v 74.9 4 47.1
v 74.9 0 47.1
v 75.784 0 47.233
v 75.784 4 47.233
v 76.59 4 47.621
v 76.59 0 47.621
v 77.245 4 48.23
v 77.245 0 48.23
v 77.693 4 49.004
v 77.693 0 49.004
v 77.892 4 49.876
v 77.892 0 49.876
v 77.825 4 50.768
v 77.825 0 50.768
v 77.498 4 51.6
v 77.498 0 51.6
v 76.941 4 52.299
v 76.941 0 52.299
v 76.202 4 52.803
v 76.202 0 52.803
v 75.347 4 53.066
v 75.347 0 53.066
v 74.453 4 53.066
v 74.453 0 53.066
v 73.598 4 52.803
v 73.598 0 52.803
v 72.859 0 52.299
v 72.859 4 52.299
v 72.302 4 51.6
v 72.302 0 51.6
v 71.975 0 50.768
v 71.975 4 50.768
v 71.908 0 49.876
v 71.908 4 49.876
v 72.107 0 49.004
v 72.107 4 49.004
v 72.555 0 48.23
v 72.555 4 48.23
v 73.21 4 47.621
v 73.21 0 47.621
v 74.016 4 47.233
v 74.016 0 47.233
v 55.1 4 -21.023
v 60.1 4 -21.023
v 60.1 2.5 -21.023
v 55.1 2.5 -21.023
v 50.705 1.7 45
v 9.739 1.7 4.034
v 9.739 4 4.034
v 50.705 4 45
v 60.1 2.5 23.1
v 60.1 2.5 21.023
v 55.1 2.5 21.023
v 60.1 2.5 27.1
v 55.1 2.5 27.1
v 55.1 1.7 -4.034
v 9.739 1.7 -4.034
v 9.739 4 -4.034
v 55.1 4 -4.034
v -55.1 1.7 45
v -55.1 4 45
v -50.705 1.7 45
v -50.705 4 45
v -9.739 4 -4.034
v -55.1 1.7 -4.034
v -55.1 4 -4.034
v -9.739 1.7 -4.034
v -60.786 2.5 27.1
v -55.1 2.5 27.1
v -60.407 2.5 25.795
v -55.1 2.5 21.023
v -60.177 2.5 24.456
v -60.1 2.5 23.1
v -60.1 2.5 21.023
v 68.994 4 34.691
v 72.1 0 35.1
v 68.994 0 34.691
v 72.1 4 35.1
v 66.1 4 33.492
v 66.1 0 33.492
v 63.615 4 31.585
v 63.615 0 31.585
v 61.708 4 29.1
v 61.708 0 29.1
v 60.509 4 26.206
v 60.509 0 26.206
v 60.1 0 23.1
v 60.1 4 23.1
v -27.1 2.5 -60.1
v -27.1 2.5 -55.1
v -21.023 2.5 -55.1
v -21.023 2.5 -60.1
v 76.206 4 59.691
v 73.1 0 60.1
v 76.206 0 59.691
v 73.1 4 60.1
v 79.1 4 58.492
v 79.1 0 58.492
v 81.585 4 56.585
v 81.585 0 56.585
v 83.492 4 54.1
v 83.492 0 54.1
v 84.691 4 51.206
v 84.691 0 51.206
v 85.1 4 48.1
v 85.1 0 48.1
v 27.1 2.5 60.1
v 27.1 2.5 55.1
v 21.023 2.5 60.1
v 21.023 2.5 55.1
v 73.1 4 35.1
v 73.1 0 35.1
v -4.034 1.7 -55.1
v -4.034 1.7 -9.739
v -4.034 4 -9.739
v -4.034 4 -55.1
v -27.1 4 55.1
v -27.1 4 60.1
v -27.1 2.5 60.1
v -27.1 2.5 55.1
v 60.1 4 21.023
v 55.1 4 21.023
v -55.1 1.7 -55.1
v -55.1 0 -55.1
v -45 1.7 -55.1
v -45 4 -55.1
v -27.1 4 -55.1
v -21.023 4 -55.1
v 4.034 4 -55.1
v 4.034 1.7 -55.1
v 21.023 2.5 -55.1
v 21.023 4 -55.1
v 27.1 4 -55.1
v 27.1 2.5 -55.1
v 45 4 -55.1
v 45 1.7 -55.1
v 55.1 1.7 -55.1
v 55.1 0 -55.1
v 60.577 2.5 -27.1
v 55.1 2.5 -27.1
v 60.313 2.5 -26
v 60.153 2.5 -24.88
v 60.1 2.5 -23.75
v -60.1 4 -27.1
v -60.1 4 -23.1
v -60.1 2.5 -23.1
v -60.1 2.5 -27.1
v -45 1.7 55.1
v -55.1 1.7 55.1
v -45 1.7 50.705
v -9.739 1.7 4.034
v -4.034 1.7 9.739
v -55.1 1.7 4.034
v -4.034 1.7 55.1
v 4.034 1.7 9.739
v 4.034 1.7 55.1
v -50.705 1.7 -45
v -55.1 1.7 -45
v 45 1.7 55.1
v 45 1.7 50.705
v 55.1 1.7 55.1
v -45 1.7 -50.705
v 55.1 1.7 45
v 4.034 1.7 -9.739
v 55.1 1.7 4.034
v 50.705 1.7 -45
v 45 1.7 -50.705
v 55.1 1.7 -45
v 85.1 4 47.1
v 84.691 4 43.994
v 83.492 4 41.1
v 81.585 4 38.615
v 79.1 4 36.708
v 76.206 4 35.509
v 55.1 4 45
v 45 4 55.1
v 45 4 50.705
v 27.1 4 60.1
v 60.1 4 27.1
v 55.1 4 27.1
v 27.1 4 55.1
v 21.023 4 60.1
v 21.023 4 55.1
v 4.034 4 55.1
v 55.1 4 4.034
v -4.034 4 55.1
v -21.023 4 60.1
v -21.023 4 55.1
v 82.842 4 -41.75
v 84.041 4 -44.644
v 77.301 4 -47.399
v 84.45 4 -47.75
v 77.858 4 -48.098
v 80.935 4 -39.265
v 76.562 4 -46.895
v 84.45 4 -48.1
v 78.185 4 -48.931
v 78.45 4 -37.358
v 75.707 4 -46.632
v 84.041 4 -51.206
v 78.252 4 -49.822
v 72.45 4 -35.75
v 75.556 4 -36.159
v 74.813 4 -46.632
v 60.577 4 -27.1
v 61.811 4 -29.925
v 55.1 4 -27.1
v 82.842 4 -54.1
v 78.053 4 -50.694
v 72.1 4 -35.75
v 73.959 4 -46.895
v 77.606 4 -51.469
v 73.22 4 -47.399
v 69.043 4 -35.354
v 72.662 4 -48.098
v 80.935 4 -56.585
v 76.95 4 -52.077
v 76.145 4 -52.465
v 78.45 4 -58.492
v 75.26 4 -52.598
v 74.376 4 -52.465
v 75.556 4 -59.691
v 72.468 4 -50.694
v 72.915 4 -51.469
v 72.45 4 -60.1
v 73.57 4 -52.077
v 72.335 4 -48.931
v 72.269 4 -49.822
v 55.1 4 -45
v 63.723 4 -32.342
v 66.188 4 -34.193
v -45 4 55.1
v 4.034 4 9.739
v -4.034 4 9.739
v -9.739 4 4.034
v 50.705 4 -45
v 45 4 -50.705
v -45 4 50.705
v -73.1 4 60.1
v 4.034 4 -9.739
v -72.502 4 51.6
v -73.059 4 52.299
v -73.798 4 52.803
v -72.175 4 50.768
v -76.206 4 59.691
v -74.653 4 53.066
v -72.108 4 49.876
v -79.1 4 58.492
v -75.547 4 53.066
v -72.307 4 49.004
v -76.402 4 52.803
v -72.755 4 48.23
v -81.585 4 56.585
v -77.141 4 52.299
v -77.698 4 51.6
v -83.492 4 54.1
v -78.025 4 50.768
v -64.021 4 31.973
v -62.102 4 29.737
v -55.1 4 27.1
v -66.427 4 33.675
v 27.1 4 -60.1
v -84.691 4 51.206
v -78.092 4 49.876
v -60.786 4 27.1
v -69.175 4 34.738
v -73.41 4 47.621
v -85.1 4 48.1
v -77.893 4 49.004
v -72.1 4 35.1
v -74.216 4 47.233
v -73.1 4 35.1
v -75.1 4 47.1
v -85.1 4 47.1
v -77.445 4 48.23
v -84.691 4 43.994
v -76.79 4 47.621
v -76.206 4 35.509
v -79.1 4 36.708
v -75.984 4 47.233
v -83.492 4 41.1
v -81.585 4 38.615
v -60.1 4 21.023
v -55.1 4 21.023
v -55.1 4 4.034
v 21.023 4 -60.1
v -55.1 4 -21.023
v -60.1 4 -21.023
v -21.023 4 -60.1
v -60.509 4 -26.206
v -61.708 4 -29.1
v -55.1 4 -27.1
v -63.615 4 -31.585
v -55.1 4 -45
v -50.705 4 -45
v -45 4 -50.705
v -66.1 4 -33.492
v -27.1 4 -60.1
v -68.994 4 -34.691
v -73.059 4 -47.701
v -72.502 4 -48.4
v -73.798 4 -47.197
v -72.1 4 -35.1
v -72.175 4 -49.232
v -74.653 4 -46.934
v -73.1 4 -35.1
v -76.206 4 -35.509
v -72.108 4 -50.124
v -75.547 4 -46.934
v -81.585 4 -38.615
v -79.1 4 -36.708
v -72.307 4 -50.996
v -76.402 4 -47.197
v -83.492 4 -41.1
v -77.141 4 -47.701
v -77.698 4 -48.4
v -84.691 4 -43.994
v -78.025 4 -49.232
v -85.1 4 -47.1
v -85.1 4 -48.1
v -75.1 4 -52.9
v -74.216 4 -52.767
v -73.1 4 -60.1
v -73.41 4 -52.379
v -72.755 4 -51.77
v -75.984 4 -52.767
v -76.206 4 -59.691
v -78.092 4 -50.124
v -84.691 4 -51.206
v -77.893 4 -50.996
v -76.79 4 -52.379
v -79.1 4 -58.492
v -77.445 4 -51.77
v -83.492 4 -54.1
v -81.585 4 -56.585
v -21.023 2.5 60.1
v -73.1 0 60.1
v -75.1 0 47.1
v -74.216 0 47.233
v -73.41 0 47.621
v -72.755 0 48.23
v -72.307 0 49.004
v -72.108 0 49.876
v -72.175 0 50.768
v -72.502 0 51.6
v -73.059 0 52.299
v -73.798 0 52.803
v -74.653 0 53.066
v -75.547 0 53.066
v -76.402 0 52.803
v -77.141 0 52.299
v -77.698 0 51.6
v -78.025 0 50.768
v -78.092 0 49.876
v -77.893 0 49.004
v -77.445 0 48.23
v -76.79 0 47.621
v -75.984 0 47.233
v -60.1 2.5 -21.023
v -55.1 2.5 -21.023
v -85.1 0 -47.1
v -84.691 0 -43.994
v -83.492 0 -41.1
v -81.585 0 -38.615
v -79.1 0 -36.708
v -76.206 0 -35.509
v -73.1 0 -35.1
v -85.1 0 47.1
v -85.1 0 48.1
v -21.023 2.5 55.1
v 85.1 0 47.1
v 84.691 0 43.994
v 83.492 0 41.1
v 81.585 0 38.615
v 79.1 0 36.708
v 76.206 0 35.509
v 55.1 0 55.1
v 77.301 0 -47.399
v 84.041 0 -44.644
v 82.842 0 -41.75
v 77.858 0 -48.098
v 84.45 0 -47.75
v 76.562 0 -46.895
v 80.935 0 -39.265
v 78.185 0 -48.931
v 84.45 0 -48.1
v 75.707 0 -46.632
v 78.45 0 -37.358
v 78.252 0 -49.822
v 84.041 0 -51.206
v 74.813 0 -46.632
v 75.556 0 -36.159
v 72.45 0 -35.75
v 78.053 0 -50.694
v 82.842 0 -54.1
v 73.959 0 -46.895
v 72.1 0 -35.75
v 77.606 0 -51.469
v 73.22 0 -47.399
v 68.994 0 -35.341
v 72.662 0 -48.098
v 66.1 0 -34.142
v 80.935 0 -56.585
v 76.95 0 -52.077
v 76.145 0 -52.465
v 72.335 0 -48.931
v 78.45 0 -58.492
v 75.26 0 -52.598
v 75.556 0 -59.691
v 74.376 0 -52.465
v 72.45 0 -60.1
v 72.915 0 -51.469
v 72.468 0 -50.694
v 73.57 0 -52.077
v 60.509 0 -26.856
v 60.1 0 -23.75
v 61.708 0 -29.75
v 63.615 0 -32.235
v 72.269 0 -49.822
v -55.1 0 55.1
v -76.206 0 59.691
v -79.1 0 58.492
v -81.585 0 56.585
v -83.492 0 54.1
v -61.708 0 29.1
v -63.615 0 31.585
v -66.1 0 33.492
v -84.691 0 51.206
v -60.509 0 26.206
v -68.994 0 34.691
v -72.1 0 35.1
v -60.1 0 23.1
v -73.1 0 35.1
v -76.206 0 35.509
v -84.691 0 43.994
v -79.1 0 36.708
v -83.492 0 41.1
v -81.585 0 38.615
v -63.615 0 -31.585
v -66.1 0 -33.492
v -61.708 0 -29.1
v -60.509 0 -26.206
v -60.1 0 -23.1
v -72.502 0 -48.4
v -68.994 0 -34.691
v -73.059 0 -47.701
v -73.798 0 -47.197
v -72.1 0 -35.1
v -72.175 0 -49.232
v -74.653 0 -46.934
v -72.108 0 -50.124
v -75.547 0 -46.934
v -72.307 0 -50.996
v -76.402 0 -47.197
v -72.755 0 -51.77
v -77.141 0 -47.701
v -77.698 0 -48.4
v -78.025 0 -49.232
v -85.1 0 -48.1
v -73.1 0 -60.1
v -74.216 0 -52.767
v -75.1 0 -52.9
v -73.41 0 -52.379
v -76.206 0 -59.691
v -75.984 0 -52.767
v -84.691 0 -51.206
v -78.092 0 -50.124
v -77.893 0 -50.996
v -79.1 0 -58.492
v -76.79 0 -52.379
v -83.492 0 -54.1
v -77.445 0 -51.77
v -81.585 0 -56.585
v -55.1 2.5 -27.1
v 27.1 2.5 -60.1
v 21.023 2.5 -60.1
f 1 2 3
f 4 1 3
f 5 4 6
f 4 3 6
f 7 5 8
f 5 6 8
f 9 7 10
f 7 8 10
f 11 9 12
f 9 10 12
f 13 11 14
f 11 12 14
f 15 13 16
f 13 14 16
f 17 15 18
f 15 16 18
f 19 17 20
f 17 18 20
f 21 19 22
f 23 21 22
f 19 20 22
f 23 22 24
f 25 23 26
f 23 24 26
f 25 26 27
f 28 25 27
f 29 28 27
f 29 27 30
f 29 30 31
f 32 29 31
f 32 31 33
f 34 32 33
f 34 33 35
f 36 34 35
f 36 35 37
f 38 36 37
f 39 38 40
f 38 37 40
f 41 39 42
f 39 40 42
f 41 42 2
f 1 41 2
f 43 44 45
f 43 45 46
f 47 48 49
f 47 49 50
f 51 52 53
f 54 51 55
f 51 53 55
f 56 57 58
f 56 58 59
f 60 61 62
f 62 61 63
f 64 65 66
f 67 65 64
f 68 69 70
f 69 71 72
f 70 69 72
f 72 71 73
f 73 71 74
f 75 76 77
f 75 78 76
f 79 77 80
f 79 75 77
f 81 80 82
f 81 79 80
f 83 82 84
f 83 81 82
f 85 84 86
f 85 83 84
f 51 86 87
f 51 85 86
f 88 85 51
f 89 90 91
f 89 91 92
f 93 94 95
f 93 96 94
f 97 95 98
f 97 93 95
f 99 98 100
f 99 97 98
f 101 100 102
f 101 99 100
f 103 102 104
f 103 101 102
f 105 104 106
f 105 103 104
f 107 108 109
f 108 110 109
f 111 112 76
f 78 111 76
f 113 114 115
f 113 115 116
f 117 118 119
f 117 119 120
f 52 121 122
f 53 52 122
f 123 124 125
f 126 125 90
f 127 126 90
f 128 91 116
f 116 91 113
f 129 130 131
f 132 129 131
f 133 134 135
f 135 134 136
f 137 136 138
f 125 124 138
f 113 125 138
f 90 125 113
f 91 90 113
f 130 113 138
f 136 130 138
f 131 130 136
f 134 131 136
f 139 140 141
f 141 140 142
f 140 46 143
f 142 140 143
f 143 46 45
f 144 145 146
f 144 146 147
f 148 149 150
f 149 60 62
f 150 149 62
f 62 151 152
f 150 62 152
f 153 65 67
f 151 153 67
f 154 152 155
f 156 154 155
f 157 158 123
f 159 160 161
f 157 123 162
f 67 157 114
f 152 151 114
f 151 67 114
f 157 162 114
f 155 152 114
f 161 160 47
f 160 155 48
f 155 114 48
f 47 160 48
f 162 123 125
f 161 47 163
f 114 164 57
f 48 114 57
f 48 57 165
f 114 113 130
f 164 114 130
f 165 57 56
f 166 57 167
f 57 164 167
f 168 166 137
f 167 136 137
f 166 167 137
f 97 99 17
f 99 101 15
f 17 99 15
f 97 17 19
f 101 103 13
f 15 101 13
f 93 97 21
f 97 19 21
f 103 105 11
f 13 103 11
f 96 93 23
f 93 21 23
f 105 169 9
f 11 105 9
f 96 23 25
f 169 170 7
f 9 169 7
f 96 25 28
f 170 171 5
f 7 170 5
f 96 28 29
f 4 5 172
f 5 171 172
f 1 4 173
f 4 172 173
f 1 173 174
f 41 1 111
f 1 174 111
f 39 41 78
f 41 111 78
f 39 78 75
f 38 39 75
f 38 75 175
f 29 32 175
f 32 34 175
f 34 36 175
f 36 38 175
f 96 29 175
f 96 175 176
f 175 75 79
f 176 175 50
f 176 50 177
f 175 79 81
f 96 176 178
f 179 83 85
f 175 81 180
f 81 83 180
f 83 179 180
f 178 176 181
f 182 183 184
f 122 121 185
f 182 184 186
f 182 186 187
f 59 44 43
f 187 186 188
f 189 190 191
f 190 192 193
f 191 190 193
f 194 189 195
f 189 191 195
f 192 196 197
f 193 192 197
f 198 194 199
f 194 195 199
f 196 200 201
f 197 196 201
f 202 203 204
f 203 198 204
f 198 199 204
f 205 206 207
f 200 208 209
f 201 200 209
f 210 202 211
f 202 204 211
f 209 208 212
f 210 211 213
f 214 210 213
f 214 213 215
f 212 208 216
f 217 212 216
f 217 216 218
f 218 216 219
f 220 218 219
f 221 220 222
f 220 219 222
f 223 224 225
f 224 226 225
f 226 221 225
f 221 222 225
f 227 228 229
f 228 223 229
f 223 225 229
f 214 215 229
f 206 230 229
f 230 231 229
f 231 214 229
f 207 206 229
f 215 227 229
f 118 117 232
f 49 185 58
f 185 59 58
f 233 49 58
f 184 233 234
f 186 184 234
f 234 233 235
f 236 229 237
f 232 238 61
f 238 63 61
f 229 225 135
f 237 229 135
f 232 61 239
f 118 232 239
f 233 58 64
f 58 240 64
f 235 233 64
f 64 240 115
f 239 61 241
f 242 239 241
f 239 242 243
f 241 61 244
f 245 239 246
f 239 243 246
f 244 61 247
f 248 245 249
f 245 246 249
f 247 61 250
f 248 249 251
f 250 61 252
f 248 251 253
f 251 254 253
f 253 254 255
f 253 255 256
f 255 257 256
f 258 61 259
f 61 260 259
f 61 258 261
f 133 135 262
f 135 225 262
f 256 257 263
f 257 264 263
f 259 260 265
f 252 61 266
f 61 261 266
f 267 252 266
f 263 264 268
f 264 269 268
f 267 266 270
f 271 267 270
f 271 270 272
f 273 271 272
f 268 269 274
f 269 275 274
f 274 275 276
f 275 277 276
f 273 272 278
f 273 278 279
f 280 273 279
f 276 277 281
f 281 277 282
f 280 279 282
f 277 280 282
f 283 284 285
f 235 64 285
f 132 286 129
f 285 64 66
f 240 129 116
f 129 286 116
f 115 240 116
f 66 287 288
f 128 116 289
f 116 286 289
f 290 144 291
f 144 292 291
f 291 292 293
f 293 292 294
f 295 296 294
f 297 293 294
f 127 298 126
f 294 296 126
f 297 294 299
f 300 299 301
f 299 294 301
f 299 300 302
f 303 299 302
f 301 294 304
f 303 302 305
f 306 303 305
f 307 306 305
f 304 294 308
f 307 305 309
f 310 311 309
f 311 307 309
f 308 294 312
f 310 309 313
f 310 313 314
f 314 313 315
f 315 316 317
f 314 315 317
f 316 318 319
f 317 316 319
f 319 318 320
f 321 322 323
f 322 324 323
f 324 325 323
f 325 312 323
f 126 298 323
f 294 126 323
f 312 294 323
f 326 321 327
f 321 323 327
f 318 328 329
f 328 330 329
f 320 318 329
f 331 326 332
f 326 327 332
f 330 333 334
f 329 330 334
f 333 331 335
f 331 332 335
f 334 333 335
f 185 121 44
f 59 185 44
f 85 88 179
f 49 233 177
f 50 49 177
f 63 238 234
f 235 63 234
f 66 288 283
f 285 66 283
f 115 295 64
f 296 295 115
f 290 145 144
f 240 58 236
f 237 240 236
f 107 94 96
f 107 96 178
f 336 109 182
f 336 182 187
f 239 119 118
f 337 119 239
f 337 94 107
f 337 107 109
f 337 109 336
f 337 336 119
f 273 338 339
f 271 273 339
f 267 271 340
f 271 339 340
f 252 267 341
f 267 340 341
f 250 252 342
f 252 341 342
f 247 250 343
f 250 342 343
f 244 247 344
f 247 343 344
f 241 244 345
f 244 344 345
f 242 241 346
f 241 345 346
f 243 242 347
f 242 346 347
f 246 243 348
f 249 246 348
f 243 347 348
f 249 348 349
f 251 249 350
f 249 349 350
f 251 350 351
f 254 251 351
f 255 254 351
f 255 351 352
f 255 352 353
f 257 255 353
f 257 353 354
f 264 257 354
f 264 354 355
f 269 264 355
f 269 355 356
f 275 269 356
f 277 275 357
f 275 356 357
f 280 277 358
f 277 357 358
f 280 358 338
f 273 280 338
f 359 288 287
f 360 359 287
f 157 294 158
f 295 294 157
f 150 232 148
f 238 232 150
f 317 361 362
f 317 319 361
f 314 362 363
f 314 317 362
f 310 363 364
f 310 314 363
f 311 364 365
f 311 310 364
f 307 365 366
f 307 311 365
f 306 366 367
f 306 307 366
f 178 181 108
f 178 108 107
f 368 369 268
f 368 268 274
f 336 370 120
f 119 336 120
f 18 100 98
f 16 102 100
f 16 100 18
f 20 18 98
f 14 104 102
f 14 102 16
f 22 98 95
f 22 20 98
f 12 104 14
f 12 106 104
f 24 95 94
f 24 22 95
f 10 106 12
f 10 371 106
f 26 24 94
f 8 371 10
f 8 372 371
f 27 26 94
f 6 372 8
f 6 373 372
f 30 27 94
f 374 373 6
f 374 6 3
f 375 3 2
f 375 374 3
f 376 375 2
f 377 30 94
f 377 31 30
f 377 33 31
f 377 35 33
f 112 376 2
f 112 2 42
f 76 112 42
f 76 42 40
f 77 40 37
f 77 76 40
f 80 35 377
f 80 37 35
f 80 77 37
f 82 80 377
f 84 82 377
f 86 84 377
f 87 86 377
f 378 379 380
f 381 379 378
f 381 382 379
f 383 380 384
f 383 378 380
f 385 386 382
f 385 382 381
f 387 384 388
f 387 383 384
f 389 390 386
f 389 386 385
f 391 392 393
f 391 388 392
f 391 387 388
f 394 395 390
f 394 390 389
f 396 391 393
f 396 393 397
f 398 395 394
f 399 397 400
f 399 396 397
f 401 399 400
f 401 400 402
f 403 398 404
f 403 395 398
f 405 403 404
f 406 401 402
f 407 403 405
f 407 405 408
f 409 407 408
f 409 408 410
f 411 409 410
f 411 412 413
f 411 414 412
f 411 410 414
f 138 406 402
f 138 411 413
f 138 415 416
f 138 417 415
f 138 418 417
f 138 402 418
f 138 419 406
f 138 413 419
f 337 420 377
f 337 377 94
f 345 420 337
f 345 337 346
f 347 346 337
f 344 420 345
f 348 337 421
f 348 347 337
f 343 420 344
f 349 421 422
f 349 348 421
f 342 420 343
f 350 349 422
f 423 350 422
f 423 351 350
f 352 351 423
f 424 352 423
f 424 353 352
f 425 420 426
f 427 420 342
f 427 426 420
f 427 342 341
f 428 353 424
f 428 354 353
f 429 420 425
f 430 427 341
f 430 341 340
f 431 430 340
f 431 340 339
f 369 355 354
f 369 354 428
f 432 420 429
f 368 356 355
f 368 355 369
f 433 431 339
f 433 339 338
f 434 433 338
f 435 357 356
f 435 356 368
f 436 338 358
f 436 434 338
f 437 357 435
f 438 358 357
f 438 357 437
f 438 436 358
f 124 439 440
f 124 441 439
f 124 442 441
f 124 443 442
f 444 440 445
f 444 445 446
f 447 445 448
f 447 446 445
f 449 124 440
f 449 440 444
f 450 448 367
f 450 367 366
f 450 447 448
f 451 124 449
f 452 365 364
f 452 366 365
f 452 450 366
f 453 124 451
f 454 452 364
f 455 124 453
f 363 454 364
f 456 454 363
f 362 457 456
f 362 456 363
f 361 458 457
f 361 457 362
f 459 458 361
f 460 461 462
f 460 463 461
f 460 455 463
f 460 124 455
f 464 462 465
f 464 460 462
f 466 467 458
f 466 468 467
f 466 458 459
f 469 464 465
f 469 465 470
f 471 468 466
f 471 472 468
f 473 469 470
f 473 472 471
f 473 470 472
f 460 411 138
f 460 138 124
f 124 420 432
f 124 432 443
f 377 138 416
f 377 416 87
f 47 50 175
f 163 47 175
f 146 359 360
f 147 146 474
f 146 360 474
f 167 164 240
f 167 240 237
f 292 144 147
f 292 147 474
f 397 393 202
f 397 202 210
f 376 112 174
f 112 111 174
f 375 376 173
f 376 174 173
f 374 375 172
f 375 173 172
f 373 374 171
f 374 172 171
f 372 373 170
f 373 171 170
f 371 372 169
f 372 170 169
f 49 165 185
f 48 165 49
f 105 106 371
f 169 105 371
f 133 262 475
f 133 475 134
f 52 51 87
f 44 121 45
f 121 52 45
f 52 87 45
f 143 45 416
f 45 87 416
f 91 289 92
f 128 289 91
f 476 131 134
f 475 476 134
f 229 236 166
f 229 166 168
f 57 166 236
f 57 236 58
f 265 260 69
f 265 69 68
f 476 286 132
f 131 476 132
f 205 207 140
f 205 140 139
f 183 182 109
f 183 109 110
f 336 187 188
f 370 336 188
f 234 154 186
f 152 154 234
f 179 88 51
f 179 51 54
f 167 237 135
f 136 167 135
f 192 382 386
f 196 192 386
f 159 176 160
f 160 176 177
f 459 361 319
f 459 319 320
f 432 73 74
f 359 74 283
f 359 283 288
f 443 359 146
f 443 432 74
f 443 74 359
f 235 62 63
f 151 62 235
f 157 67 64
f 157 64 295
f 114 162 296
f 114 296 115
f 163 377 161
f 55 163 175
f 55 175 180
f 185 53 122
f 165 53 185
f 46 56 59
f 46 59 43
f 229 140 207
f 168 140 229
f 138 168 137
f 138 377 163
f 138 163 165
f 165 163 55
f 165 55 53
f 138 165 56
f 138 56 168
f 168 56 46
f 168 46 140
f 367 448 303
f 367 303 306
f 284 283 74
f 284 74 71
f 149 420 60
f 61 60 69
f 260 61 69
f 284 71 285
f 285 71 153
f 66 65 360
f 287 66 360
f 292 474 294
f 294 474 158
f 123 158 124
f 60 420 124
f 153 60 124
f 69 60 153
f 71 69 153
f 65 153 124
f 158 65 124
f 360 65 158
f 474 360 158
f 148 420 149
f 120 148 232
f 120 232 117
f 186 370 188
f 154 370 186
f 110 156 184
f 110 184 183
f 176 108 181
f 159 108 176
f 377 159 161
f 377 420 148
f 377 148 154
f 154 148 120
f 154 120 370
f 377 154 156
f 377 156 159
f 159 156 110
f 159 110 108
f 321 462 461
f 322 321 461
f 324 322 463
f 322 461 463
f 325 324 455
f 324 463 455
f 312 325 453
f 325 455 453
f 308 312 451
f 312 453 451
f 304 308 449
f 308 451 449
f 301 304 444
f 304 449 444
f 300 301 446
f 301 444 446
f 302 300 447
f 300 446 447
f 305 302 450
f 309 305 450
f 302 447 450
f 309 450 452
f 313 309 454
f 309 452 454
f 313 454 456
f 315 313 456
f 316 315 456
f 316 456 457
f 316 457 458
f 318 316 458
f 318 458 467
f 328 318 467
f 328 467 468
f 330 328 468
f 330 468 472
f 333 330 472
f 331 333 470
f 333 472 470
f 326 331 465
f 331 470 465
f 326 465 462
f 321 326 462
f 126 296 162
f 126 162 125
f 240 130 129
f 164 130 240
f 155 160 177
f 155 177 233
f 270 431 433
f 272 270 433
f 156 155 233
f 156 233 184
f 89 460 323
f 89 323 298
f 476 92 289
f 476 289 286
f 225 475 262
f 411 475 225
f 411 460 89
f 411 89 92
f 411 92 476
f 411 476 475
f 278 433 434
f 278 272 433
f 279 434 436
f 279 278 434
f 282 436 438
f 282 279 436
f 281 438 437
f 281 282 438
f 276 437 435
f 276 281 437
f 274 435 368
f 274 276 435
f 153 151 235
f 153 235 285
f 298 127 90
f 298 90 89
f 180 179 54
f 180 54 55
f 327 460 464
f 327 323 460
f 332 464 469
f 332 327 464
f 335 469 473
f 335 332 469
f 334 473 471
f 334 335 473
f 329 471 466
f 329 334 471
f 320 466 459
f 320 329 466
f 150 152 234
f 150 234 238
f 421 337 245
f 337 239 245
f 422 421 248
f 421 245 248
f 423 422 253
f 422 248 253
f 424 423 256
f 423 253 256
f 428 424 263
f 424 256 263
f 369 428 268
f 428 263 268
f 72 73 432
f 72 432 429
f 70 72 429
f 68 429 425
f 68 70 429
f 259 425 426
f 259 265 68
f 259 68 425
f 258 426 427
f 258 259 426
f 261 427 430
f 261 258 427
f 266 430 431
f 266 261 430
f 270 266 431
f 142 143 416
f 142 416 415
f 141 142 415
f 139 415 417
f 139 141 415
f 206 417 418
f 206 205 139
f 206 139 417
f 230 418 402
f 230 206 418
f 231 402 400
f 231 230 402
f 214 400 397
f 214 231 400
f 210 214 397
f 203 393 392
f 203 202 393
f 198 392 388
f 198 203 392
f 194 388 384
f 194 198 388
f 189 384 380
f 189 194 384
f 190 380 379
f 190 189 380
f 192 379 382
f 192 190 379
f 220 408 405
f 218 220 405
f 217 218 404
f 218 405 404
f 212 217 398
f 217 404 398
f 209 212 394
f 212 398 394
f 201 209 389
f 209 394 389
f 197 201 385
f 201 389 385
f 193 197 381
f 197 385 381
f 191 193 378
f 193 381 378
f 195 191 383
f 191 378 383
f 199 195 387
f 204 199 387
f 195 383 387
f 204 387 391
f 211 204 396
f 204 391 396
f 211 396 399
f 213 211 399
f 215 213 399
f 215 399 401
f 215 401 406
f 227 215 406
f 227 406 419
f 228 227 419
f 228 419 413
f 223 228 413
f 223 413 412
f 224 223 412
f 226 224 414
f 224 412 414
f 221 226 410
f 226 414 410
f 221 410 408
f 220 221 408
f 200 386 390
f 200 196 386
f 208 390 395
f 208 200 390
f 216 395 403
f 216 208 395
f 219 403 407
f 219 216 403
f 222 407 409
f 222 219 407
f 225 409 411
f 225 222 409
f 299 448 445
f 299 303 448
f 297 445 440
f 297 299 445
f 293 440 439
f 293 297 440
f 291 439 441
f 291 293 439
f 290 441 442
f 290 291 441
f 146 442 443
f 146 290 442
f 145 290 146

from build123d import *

# Parameters (mm, degrees)
SKETCH1_W           = 120.2
SKETCH1_H           = 120.2
SKETCH1_W_2         = 110.2
SKETCH1_H_2         = 110.2
BOSS_EXTRUDE1_DEPTH = 4
SKETCH2_W           = 10.1
SKETCH2_H           = 10.1
BOSS_EXTRUDE2_DEPTH = 2.3
SKETCH3_W           = 25
SKETCH3_H           = 25
SKETCH3_R           = 3
SKETCH3_W_2         = 24.35
SKETCH3_H_2         = 24.35
BOSS_EXTRUDE3_DEPTH = 4
FILLET1_R           = 12
SKETCH5_R           = 5.417288046
BOSS_EXTRUDE4_DEPTH = 10
CUT_EXTRUDE1_START  = -12.5
SKETCH4_W           = 6.076696642
SKETCH4_H           = 5
CUT_EXTRUDE1_DEPTH  = 10
CIRPATTERN1_COUNT   = 4
SKETCH6_R           = 22.094645404
CUT_EXTRUDE2_DEPTH  = 10
BOSS_EXTRUDE5_DEPTH = 2.3
SKETCH9_W           = 17.742485537
SKETCH9_H           = 24.263991122
SKETCH9_W_2         = 24.263991122
SKETCH9_H_2         = 17.742485537
CUT_EXTRUDE3_DEPTH  = 10


with BuildPart() as part:
    # Sketch1 → Boss-Extrude1 (new body)
    with BuildSketch(Plane(origin=(0, 0, 0), x_dir=(1, 0, 0), z_dir=(0, 1, 0))):
        Rectangle(SKETCH1_W, SKETCH1_H)
        Rectangle(SKETCH1_W_2, SKETCH1_H_2, mode=Mode.SUBTRACT)
    extrude(amount=BOSS_EXTRUDE1_DEPTH)

    # Sketch2 → Boss-Extrude2 (add)
    with BuildSketch(Plane(origin=(0, 4, 0), x_dir=(1, 0, 0), z_dir=(0, 1, 0))):
        with Locations((-50.05, 50.05)):
            Rectangle(SKETCH2_W, SKETCH2_H)
        with Locations((50.05, 50.05)):
            Rectangle(SKETCH2_W, SKETCH2_H)
        with Locations((50.05, -50.05)):
            Rectangle(SKETCH2_W, SKETCH2_H)
        with Locations((-50.05, -50.05)):
            Rectangle(SKETCH2_W, SKETCH2_H)
    extrude(amount=-BOSS_EXTRUDE2_DEPTH)

    # Sketch3 → Boss-Extrude3 (add)
    # profile 1 of 4: a face of its own
    with BuildSketch(Plane(origin=(0, 0, 0), x_dir=(-1, 0, 0), z_dir=(0, -1, 0))):
        with Locations((72.6, -47.6)):
            Rectangle(SKETCH3_W, SKETCH3_H)
        with Locations(Location((75.1, -50.1, 0), (0, 0, 90))):
            Circle(SKETCH3_R, mode=Mode.SUBTRACT)
    # profile 2 of 4: a face of its own
    with BuildSketch(Plane(origin=(0, 0, 0), x_dir=(-1, 0, 0), z_dir=(0, -1, 0))):
        with Locations((-72.6, -47.6)):
            Rectangle(SKETCH3_W, SKETCH3_H)
        with Locations(Location((-74.9, -50.1, 0), (0, 0, 90))):
            Circle(SKETCH3_R, mode=Mode.SUBTRACT)
    # profile 3 of 4: a face of its own
    with BuildSketch(Plane(origin=(0, 0, 0), x_dir=(-1, 0, 0), z_dir=(0, -1, 0))):
        with Locations((72.6, 47.6)):
            Rectangle(SKETCH3_W, SKETCH3_H)
        with Locations(Location((75.1, 49.9, 0), (0, 0, 90))):
            Circle(SKETCH3_R, mode=Mode.SUBTRACT)
    # profile 4 of 4: a face of its own
    with BuildSketch(Plane(origin=(0, 0, 0), x_dir=(-1, 0, 0), z_dir=(0, -1, 0))):
        with Locations((-72.275, 47.925)):
            Rectangle(SKETCH3_W_2, SKETCH3_H_2)
        with Locations(Location((-75.260238187, 49.598128293, 0), (0, 0, 90))):
            Circle(SKETCH3_R, mode=Mode.SUBTRACT)
    extrude(amount=-BOSS_EXTRUDE3_DEPTH)

    # Fillet1
    fillet1_edges = [part.edges().sort_by_distance(p)[0] for p in [
        (85.1, 2, 60.1),
        (85.1, 2, 35.1),
        (60.1, 2, 35.1),
        (84.45, 2, -60.1),
        (60.1, 2, -35.75),
        (84.45, 2, -35.75),
        (-60.1, 2, 35.1),
        (-85.1, 2, 35.1),
        (-85.1, 2, 60.1),
        (-60.1, 2, -35.1),
        (-85.1, 2, -60.1),
        (-85.1, 2, -35.1),
    ]]
    fillet(fillet1_edges, radius=FILLET1_R)

    # Sketch4 → Cut-Extrude1 (cut)
    with BuildSketch(Plane(origin=(0, 0, 0), x_dir=(-1, 0, 0), z_dir=(0, -1, 0)).offset(CUT_EXTRUDE1_START)):
        with BuildLine():
            Line((60.786291501, -27.1), (64.782340933, -27.1))
            Line((64.782340933, -27.1), (64.782340933, -21.023303358))
            Line((64.782340933, -21.023303358), (60.1, -21.023303358))
            Line((60.1, -21.023303358), (60.1, -23.1))
            ThreePointArc((60.1, -23.1), (60.272817284, -25.129223745), (60.786291501, -27.1))
        make_face()
        with BuildLine():
            Line((55.1, -27.1), (60.786291501, -27.1))
            ThreePointArc((60.786291501, -27.1), (60.272817284, -25.129223745), (60.1, -23.1))
            Line((60.1, -23.1), (60.1, -21.023303358))
            Line((60.1, -21.023303358), (55.1, -21.023303358))
            Line((55.1, -21.023303358), (55.1, -27.1))
        make_face()
        with Locations((24.061651679, -57.6)):
            Rectangle(SKETCH4_W, SKETCH4_H)
    cut_extrude1 = extrude(amount=CUT_EXTRUDE1_DEPTH, mode=Mode.SUBTRACT)

    # CirPattern1: Cut-Extrude1 ×4 about axis
    cirpattern1_axis = Axis((0, 0, 0), (0, 1, 0))
    for i in range(1, CIRPATTERN1_COUNT):
        add(cut_extrude1.rotate(cirpattern1_axis, i * 360 / CIRPATTERN1_COUNT), mode=Mode.SUBTRACT)

    # Sketch8 → Boss-Extrude5 (add)
    with BuildSketch(Plane(origin=(0, 1.7, 0), x_dir=(-1, 0, 0), z_dir=(0, -1, 0))):
        Polygon((50.704922644, -45), (9.738912133, -4.033989488), (4.033989488, -4.033989488), (4.033989488, -9.738912133), (45, -50.704922645), (45, -45), align=None)
        Polygon((4.033989488, -9.738912133), (0, -5.704922645), (-4.033989488, -9.738912133), (-4.033989488, -75.048460322), (4.033989488, -75.048460322), align=None)
        Polygon((-50.214813889, -55.919736534), (-4.033989488, -9.738912133), (-4.033989488, -4.033989488), (-9.738912133, -4.033989488), (-55.919736534, -50.214813889), align=None)
        Polygon((-9.738912133, -4.033989488), (-5.704922645, 0), (-9.738912133, 4.033989488), (-75.048460322, 4.033989488), (-75.048460322, -4.033989488), align=None)
        Polygon((-4.033989488, 4.033989488), (-4.033989488, 9.738912133), (-50.214813889, 55.919736534), (-55.919736534, 50.214813889), (-9.738912133, 4.033989488), align=None)
        Polygon((0, 5.704922645), (4.033989488, 9.738912133), (4.033989488, 75.048460322), (-4.033989488, 75.048460322), (-4.033989488, 9.738912133), align=None)
        Polygon((9.738912133, 4.033989488), (55.919736534, 50.214813889), (50.214813889, 55.919736534), (4.033989488, 9.738912133), (4.033989488, 4.033989488), align=None)
        Polygon((75.048460322, 4.033989488), (9.738912133, 4.033989488), (5.704922645, 0), (9.738912133, -4.033989488), (75.048460322, -4.033989488), align=None)
        Polygon((-4.033989488, -9.738912133), (0, -5.704922645), (-1.670933156, -4.033989488), (-4.033989488, -4.033989488), align=None)
        Polygon((4.033989488, -4.033989488), (1.670933156, -4.033989488), (0, -5.704922645), (4.033989488, -9.738912133), align=None)
        Polygon((9.738912133, -4.033989488), (5.704922645, 0), (4.033989488, -1.670933156), (4.033989488, -4.033989488), align=None)
        Polygon((5.704922645, 0), (9.738912133, 4.033989488), (4.033989488, 4.033989488), (4.033989488, 1.670933156), align=None)
        Polygon((1.670933156, 4.033989488), (4.033989488, 4.033989488), (4.033989488, 9.738912133), (0, 5.704922645), align=None)
        Polygon((-1.670933156, 4.033989488), (0, 5.704922645), (-4.033989488, 9.738912133), (-4.033989488, 4.033989488), align=None)
        Polygon((-5.704922645, 0), (-4.033989488, 1.670933156), (-4.033989488, 4.033989488), (-9.738912133, 4.033989488), align=None)
        Polygon((-9.738912133, -4.033989488), (-4.033989488, -4.033989488), (-4.033989488, -1.670933157), (-5.704922645, 0), align=None)
        Polygon((0, -5.704922645), (1.670933156, -4.033989488), (-1.670933156, -4.033989488), align=None)
        Polygon((4.033989488, -4.033989488), (4.033989488, -1.670933156), (1.670933156, -4.033989488), align=None)
        Polygon((4.033989488, -1.670933156), (5.704922645, 0), (4.033989488, 1.670933156), align=None)
        Polygon((4.033989488, 1.670933156), (4.033989488, 4.033989488), (1.670933156, 4.033989488), align=None)
        Polygon((-4.033989488, 1.670933156), (-1.670933156, 4.033989488), (-4.033989488, 4.033989488), align=None)
        Polygon((-4.033989488, -1.670933157), (-4.033989488, 1.670933156), (-5.704922645, 0), align=None)
        Polygon((-4.033989488, -4.033989488), (-1.670933156, -4.033989488), (-4.033989488, -1.670933157), align=None)
        Polygon((1.670933156, -4.033989488), (4.033989488, -1.670933156), (4.033989488, 1.670933156), (1.670933156, 4.033989488), (-1.670933156, 4.033989488), (-4.033989488, 1.670933156), (-4.033989488, -1.670933157), (-1.670933156, -4.033989488), align=None)
        Polygon((-1.670933156, 4.033989488), (1.670933156, 4.033989488), (0, 5.704922645), align=None)
    extrude(amount=-BOSS_EXTRUDE5_DEPTH)

    # Sketch9 → Cut-Extrude3 (cut)
    with BuildSketch(Plane(origin=(0, 1.7, 0), x_dir=(-1, 0, 0), z_dir=(0, -1, 0))):
        with Locations((1.428324636, -72.231995561)):
            Rectangle(SKETCH9_W, SKETCH9_H)
        with Locations((-72.231995561, -1.428324636)):
            Rectangle(SKETCH9_W_2, SKETCH9_H_2)
        with Locations((-1.428324636, 72.231995561)):
            Rectangle(SKETCH9_W, SKETCH9_H)
        with Locations((72.231995561, 1.428324636)):
            Rectangle(SKETCH9_W_2, SKETCH9_H_2)
    extrude(amount=-CUT_EXTRUDE3_DEPTH, mode=Mode.SUBTRACT)


with BuildPart() as body_2:
    # Sketch5 → Boss-Extrude4 (new body)
    with BuildSketch(Plane.XZ):
        with Locations(Location((0, 0, 0), (0, 0, 270))):
            Circle(SKETCH5_R)
    extrude(amount=BOSS_EXTRUDE4_DEPTH)

    # Sketch6 → Cut-Extrude2 (cut)
    with BuildSketch(Plane.XZ.offset(10)):
        Circle(SKETCH6_R)
    extrude(amount=-CUT_EXTRUDE2_DEPTH, mode=Mode.SUBTRACT)


solid = part.part
